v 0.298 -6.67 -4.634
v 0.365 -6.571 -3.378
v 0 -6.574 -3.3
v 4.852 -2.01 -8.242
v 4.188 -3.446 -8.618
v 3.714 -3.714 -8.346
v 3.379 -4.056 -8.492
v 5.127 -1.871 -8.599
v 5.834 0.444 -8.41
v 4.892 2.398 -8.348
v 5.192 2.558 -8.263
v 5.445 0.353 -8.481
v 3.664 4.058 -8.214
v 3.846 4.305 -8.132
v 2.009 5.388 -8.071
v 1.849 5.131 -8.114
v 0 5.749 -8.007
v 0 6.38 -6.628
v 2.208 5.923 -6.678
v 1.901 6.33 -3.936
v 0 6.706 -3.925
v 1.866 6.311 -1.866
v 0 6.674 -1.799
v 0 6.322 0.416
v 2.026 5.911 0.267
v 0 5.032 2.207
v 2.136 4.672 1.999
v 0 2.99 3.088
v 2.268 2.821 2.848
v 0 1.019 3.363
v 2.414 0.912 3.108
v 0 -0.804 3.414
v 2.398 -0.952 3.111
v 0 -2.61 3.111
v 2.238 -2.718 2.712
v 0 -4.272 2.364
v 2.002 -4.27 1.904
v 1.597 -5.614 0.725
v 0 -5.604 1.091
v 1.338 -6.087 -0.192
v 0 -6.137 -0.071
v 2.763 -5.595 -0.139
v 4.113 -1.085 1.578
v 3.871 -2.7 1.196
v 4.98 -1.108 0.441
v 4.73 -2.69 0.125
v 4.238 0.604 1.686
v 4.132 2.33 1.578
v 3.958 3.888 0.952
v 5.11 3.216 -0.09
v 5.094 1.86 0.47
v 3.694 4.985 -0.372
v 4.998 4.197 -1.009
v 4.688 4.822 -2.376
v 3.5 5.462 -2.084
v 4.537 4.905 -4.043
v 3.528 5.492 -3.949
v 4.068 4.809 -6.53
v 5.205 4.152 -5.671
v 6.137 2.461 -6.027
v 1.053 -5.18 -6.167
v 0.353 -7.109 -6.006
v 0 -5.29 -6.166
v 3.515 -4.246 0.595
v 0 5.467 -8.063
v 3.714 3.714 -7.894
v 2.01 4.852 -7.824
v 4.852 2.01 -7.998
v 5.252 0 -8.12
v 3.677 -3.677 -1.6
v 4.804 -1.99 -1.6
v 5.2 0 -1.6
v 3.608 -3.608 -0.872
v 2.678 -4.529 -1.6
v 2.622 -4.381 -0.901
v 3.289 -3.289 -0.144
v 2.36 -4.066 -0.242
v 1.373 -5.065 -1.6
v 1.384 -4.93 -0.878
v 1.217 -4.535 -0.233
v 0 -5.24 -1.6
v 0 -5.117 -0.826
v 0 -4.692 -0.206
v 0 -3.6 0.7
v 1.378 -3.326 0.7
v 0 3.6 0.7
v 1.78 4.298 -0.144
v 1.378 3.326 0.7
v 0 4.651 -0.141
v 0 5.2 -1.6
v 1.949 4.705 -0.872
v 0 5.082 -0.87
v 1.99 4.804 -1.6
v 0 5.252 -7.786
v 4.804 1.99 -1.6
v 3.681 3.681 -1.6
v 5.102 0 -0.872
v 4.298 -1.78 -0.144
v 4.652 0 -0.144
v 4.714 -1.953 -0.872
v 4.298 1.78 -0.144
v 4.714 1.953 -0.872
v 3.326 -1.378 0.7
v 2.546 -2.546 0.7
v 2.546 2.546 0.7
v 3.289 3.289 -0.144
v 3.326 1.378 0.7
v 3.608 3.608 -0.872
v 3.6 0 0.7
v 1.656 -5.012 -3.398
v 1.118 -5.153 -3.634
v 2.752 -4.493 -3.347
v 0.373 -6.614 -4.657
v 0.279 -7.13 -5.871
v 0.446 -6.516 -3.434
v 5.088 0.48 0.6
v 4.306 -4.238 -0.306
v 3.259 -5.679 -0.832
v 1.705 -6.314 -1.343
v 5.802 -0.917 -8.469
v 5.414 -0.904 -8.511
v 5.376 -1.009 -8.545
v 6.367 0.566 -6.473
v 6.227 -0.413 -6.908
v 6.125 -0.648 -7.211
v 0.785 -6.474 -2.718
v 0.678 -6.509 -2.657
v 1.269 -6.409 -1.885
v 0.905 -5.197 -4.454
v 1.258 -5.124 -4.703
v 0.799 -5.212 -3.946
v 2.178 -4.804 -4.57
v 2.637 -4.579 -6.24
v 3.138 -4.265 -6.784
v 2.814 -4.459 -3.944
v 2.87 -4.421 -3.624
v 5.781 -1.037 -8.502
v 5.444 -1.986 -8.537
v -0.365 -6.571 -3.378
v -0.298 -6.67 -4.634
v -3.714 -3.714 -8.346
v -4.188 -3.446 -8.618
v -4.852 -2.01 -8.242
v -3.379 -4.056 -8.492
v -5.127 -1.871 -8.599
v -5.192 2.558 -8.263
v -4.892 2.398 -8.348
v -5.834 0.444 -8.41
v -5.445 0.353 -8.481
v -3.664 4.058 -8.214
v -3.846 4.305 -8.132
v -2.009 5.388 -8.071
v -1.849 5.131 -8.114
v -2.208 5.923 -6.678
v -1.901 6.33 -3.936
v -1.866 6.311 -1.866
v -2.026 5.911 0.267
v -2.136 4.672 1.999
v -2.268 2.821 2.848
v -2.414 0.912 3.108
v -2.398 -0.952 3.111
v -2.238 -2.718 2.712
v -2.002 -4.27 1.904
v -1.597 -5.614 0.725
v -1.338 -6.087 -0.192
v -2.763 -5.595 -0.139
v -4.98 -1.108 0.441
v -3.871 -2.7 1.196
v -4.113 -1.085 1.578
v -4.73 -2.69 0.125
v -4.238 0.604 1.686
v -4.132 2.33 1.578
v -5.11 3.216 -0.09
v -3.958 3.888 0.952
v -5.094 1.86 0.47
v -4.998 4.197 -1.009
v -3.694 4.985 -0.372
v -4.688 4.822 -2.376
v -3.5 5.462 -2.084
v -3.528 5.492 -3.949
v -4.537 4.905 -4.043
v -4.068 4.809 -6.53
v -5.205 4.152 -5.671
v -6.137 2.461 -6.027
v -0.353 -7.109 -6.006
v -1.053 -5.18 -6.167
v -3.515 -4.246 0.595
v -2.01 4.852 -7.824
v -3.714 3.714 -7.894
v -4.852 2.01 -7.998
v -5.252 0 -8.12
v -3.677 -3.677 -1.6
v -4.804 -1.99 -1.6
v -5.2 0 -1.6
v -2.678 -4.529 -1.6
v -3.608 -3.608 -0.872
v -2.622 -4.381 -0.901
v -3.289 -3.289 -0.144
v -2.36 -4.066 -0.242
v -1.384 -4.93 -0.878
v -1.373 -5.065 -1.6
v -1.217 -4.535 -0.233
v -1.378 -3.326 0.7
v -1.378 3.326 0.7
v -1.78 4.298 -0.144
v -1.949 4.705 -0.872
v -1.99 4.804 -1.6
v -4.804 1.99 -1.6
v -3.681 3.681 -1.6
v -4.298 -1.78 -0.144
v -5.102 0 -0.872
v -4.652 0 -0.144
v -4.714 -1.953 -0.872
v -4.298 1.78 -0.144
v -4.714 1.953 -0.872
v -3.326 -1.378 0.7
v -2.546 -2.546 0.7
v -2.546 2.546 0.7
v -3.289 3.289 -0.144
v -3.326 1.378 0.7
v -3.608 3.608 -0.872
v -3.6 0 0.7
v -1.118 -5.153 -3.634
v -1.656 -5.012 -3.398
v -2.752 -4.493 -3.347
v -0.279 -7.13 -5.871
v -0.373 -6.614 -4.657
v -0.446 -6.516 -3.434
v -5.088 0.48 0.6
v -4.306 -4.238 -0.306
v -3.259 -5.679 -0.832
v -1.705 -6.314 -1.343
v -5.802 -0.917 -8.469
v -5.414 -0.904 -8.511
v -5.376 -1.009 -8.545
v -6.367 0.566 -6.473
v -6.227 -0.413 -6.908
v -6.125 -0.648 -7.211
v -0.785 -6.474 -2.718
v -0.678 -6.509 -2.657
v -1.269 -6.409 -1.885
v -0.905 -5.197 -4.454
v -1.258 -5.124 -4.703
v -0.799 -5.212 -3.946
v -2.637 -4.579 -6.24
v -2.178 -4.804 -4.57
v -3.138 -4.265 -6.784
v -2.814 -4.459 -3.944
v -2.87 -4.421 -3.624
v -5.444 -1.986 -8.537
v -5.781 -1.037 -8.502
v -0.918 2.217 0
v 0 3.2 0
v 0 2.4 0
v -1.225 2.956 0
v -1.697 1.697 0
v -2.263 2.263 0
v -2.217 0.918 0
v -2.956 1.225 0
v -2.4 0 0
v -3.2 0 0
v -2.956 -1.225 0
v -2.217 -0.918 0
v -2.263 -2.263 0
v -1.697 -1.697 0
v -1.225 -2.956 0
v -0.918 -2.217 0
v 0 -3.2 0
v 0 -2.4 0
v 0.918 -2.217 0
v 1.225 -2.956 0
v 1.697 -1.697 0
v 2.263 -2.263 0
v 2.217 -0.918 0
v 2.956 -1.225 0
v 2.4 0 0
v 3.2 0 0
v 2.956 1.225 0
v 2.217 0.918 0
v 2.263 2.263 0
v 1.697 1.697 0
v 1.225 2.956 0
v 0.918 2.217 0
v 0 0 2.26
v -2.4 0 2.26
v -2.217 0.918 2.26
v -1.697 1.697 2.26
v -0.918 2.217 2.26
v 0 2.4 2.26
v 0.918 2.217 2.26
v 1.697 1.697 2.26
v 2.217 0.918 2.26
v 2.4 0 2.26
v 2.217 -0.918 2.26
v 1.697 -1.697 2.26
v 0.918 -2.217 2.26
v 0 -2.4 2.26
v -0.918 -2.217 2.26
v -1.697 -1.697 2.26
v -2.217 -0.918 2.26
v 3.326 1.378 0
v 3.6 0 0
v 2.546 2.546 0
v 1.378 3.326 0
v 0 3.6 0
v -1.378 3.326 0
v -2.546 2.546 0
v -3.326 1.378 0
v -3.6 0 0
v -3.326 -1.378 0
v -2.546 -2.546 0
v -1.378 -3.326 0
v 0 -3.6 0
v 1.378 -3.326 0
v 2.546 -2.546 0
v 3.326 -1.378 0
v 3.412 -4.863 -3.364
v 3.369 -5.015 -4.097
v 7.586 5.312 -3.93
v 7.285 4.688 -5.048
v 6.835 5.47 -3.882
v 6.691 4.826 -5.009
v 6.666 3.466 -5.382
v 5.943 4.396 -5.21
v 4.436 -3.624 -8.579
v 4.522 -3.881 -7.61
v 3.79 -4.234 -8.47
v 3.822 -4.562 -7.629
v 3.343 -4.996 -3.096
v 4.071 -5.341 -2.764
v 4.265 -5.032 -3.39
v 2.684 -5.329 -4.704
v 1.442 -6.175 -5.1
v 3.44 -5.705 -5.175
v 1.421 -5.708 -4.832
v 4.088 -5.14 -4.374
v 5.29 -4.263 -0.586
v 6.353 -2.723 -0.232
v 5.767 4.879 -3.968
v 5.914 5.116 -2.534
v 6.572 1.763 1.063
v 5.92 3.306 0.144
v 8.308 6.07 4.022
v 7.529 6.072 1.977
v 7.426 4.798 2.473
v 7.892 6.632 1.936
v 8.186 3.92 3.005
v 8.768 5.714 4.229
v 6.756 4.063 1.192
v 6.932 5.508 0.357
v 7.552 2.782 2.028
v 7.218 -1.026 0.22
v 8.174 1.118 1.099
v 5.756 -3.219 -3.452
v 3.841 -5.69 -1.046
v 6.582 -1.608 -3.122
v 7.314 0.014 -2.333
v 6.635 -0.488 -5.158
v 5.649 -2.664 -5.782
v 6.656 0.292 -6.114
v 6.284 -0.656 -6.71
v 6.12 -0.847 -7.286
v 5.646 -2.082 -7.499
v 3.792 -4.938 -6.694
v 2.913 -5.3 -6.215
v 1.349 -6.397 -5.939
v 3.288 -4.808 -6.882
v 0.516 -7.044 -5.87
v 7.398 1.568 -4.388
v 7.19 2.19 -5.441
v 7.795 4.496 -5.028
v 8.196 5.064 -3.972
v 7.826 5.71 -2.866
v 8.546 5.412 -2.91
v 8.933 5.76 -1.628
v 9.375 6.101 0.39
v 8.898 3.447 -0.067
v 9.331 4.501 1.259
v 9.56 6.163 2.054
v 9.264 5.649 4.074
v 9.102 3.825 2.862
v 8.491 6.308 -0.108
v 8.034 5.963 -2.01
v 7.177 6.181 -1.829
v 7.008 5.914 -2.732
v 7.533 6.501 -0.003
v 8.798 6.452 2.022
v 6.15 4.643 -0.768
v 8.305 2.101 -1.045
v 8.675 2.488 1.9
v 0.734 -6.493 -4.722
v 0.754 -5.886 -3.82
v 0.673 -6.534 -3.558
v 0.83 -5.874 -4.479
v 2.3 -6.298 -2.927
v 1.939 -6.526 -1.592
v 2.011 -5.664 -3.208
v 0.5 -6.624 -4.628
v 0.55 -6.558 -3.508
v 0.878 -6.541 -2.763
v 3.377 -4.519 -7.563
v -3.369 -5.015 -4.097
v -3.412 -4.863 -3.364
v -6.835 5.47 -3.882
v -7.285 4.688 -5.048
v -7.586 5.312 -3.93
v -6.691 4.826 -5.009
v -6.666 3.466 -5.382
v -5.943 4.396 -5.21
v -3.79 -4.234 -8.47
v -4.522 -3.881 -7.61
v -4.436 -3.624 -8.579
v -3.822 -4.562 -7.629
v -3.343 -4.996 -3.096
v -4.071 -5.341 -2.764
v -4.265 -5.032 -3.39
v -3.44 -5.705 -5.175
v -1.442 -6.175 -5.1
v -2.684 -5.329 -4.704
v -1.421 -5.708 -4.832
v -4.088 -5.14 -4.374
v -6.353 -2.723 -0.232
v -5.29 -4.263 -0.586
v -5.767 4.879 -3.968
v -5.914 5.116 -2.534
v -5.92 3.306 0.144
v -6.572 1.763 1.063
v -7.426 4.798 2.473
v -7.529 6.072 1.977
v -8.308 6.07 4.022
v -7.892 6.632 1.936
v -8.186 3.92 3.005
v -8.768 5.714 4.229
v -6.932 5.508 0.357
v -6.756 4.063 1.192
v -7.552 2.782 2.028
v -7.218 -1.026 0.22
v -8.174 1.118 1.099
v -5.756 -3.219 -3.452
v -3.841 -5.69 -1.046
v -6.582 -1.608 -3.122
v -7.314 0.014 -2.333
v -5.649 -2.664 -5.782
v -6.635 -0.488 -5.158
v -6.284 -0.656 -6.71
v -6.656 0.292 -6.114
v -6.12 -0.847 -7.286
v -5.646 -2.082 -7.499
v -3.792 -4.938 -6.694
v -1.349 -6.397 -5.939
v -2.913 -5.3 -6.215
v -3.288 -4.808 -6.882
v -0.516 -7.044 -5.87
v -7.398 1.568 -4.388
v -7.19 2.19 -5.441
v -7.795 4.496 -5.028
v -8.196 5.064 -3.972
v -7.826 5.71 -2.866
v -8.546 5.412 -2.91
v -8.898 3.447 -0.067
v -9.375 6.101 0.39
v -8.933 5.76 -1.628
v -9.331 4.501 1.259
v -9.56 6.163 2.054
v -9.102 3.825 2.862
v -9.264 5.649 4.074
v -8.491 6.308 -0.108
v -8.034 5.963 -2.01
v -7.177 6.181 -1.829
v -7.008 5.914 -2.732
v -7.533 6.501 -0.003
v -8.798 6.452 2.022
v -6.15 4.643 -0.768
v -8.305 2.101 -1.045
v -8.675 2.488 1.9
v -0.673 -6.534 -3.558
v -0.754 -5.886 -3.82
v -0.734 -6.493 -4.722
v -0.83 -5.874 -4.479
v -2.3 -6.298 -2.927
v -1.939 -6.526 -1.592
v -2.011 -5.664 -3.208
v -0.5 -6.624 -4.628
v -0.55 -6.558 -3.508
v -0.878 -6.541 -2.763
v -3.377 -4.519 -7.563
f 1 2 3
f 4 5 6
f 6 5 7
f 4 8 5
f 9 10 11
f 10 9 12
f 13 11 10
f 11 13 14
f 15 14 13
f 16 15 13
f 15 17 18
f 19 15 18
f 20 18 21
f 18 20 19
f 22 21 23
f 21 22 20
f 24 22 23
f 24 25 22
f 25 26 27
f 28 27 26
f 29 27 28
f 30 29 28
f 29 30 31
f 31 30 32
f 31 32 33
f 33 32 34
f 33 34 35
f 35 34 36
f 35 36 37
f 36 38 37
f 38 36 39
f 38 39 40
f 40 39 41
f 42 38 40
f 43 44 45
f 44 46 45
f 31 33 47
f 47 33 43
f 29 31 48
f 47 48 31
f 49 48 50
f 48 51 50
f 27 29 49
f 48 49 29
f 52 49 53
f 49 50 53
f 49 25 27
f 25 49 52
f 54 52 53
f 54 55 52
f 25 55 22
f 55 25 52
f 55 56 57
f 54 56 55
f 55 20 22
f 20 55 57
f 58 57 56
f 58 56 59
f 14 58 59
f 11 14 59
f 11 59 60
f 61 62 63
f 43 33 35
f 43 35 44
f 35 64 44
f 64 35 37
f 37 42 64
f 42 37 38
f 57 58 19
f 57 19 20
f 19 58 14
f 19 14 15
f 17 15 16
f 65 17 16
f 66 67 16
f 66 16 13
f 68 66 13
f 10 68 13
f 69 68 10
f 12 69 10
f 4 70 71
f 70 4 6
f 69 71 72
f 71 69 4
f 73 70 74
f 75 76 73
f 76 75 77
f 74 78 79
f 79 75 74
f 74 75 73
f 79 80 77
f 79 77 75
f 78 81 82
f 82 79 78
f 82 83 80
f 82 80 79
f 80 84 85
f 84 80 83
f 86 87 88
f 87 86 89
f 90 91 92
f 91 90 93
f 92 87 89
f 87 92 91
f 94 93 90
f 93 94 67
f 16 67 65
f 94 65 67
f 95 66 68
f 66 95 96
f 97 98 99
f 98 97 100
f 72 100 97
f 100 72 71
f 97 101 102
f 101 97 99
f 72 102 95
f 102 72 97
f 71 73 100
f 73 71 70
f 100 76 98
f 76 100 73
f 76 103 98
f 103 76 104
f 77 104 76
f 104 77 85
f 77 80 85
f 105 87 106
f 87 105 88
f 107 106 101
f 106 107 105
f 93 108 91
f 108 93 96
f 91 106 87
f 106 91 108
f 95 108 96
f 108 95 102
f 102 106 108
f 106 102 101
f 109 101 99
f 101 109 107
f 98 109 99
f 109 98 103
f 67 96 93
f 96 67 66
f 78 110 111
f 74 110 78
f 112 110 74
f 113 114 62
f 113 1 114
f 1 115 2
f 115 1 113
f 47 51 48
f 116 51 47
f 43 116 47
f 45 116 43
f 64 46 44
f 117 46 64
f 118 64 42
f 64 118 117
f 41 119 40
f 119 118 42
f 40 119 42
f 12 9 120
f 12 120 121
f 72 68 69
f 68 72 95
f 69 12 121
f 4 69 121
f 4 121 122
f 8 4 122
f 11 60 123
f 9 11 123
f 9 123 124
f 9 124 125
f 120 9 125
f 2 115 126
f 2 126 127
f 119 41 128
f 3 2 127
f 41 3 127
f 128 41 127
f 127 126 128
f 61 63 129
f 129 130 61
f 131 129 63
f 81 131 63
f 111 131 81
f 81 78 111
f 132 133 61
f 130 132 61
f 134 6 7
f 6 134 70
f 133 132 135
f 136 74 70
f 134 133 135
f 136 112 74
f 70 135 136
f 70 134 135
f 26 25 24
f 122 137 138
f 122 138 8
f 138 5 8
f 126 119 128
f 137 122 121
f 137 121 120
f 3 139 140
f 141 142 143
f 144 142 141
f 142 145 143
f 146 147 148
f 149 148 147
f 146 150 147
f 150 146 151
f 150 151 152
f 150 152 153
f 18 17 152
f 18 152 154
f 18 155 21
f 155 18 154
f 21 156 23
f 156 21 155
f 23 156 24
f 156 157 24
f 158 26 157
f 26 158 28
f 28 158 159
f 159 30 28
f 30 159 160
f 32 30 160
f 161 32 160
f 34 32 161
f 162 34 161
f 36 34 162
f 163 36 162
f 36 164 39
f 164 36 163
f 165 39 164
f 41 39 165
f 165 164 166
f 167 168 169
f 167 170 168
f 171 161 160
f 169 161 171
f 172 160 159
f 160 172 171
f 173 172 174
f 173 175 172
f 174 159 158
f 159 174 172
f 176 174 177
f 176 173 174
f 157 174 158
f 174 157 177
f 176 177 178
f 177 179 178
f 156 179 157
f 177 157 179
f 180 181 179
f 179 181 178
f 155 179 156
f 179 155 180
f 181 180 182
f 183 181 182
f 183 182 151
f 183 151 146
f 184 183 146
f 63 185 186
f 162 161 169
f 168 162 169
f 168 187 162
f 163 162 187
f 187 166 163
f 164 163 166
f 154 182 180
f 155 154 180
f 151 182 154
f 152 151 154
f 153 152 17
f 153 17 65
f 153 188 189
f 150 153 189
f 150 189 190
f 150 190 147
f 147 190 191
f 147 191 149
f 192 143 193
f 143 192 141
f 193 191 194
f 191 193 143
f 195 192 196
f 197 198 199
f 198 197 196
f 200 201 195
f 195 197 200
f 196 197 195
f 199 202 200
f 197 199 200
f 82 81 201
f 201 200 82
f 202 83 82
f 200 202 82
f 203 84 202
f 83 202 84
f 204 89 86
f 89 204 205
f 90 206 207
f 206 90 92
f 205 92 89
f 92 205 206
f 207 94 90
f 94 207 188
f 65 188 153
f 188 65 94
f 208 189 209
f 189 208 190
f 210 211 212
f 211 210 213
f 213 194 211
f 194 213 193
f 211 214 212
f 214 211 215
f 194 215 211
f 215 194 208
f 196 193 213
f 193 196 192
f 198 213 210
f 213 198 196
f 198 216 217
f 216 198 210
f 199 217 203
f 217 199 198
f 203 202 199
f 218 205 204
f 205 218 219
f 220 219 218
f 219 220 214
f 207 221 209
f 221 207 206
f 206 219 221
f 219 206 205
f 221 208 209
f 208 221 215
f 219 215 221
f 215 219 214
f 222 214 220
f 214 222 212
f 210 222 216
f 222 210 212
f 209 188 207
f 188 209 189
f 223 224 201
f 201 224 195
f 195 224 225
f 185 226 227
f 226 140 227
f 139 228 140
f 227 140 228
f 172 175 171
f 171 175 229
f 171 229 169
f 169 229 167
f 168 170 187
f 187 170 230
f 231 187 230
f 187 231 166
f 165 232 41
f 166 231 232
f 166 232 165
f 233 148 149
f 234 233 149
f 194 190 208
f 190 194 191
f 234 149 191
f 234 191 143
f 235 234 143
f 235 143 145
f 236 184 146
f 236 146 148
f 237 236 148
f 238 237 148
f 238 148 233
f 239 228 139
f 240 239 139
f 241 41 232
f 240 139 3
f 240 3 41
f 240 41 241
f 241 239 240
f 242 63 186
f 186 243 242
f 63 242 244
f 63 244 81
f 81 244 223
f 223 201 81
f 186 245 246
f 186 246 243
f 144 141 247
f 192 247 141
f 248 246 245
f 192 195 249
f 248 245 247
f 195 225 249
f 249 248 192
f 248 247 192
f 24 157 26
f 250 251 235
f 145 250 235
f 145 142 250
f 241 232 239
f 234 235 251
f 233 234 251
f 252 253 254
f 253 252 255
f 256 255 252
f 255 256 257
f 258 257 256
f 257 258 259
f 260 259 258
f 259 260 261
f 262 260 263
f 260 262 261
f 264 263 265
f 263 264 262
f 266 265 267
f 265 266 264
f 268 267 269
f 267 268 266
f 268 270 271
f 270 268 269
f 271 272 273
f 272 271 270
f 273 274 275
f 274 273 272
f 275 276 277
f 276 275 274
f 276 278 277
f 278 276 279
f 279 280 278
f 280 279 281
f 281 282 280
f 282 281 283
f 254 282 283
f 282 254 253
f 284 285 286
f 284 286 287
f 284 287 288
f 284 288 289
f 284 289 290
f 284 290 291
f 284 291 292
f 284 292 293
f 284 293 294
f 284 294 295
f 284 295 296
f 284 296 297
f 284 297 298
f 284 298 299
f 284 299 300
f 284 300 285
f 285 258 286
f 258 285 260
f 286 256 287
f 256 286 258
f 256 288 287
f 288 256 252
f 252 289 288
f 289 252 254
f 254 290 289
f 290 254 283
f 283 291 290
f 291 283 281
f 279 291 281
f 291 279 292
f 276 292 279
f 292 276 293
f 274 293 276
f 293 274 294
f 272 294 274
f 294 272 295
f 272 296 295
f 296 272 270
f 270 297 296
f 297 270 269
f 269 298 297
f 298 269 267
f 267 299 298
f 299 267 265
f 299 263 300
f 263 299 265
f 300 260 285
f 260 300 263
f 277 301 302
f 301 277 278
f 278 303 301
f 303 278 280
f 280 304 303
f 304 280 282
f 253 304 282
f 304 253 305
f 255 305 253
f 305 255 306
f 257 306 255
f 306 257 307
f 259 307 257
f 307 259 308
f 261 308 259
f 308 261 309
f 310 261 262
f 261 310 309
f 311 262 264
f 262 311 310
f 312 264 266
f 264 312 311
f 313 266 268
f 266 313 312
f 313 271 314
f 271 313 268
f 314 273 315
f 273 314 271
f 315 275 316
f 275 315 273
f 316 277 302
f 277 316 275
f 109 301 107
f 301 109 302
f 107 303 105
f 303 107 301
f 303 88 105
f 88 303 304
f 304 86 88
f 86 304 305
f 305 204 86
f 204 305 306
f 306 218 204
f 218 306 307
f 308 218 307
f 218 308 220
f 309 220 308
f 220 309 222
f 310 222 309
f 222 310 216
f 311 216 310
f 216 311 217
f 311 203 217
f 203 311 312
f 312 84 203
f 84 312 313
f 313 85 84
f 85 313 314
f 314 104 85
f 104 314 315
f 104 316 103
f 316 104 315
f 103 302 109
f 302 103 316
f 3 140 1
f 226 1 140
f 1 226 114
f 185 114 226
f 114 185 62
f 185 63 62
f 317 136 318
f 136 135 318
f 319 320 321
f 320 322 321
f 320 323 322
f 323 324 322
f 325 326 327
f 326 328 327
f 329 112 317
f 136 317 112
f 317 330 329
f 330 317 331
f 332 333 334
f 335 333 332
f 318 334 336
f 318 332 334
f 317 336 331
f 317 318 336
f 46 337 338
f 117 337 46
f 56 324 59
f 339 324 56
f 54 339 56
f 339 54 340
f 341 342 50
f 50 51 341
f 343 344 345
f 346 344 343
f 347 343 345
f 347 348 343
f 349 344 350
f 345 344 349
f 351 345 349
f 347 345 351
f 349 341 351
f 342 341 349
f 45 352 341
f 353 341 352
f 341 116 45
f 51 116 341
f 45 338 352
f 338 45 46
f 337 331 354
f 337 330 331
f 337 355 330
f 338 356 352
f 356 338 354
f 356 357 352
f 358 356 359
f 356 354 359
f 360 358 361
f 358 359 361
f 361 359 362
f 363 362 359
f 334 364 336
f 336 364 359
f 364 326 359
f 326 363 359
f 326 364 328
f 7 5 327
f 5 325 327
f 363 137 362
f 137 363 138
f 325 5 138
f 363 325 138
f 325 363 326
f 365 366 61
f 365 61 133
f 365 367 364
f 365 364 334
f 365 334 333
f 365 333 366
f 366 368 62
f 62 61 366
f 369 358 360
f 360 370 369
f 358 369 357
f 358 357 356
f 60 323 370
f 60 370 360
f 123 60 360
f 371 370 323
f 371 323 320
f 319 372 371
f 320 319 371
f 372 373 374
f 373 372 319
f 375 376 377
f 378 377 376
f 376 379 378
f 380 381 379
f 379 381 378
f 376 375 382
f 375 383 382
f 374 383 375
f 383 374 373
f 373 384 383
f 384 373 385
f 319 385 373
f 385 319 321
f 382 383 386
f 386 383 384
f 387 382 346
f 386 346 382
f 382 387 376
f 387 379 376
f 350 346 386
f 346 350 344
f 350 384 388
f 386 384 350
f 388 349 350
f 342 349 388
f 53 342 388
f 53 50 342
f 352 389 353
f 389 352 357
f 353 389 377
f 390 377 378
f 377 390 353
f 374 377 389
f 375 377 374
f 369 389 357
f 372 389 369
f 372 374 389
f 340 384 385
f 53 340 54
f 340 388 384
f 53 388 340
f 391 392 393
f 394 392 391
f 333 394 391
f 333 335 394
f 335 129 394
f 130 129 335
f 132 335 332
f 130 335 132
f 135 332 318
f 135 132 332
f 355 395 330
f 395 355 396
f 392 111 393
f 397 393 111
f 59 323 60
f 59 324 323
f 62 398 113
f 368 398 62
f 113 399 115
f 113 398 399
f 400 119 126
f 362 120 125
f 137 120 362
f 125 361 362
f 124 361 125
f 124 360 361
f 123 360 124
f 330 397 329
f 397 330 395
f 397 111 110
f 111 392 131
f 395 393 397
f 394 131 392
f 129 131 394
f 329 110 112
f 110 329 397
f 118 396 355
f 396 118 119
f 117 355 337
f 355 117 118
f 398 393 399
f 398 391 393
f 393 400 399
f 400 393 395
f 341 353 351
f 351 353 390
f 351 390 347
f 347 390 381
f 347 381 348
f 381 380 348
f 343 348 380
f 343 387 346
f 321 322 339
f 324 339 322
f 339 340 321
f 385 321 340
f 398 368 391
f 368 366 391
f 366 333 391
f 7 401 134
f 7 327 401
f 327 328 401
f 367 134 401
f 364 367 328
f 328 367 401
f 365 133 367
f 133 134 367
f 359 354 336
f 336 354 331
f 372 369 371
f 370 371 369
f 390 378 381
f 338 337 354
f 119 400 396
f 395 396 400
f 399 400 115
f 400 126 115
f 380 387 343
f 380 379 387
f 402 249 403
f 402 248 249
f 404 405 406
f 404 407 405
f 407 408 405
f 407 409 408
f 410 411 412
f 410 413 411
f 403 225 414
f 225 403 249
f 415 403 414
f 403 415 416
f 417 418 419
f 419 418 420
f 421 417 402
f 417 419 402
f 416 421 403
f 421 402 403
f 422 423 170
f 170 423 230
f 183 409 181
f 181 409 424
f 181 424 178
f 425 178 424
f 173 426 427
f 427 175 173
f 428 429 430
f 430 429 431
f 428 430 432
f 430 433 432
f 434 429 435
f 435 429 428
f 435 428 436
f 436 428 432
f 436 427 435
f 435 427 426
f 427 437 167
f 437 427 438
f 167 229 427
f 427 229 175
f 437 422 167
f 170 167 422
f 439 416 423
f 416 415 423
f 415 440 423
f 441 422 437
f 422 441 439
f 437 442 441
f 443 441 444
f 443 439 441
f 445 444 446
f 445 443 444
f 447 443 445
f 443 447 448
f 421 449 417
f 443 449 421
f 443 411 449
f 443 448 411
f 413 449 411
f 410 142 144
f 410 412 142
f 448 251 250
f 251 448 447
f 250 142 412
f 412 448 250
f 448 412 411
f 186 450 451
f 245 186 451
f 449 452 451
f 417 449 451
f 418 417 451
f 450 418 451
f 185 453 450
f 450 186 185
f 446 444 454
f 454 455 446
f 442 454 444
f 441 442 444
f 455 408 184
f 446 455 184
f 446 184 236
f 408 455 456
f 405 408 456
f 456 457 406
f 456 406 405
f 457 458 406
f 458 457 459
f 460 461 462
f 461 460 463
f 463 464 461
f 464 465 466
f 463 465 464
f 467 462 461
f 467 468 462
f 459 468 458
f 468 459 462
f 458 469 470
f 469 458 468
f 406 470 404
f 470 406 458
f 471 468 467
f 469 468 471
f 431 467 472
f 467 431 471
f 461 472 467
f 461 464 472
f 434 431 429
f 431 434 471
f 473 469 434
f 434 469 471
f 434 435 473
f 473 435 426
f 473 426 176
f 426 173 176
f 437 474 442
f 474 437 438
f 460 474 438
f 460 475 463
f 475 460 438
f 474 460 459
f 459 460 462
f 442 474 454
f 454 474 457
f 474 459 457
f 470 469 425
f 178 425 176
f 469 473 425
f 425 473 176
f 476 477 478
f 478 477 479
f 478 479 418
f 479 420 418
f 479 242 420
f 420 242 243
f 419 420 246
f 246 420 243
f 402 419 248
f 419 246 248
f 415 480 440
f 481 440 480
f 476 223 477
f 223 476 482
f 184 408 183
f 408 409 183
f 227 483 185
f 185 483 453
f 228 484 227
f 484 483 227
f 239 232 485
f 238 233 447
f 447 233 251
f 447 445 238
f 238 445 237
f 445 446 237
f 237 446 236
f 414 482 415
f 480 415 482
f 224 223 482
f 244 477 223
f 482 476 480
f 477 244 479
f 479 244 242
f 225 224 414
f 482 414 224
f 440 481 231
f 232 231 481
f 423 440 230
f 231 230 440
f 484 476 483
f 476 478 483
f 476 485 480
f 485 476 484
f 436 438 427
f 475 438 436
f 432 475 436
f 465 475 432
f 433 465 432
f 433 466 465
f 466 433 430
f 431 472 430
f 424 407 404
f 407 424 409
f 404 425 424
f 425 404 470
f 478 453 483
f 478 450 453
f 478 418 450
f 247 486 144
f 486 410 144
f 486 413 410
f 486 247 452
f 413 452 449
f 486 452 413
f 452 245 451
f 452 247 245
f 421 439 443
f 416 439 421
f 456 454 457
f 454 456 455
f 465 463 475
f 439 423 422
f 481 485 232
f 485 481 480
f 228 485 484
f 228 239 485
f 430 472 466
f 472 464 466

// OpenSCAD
use <../lib.scad>
use <../p/4-4cylo.scad>
use <../p/4-4ring8.scad>
use <s/17018s01.scad>
use <s/17018s02.scad>
use <../p/stud4o.scad>
function ldraw_lib__17018() = [
// 0 Minifig Helmet Wolverine
// 0 Name: 17018.dat
// 0 Author: Magnus Forsberg [MagFors]
// 0 !LDRAW_ORG Part UPDATE 2023-04
// 0 !LICENSE Licensed under CC BY 4.0 : see CAreadme.txt
// 
// 0 BFC CERTIFY CCW
  [0,"BFC","CERTIFY"],
  [0,"BFC","CCW"],
// 
// 0 !CATEGORY Minifig Headwear
// 
// 0 !HISTORY 2014-10-16 {LEGO Digital Designer} Original part shape
// 0 !HISTORY 2022-06-12 [MagFors] File preparation for LDraw Parts Tracker
// 0 !HISTORY 2023-08-25 [OrionP] Official Update 2023-04
// 
// 
// 1 16 0 0 0 1 0 0 0 1 0 0 0 1 s\17018s01.dat
  [1,16,0,0,0,1,0,0,0,1,0,0,0,1, ldraw_lib__s__17018s01()],
// 1 16 0 0 0 -1 0 0 0 1 0 0 0 1 s\17018s01.dat
  [1,16,0,0,0,-1,0,0,0,1,0,0,0,1, ldraw_lib__s__17018s01()],
// 1 16 0 -5.65 0 1 0 0 0 -1.4125 0 0 0 1 stud4o.dat
  [1,16,0,-5.65,0,1,0,0,0,-1.4125,0,0,0,1, ldraw_lib__stud4o()],
// 1 16 0 0 0 1 0 0 0 -1 0 0 0 1 4-4ring8.dat
  [1,16,0,0,0,1,0,0,0,-1,0,0,0,1, ldraw_lib__4_4ring8()],
// 1 16 0 0 0 9 0 0 0 -1.75 0 0 0 9 4-4cylo.dat
  [1,16,0,0,0,9,0,0,0,-1.75,0,0,0,9, ldraw_lib__4_4cylo()],
// 3 16 0 8.249 -16.435 -0.745 11.586 -16.675 0.745 11.586 -16.675
  [3,16,0,8.249,-16.435,-0.745,11.586,-16.675,0.745,11.586,-16.675],
// 4 16 0.745 11.586 -16.675 -0.745 11.586 -16.675 -0.697 14.678 -17.825 0.697 14.678 -17.825
  [4,16,0.745,11.586,-16.675,-0.745,11.586,-16.675,-0.697,14.678,-17.825,0.697,14.678,-17.825],
// 4 16 -0.697 14.678 -17.825 -0.882 15.014 -17.772 0.882 15.014 -17.772 0.697 14.678 -17.825
  [4,16,-0.697,14.678,-17.825,-0.882,15.014,-17.772,0.882,15.014,-17.772,0.697,14.678,-17.825],
// 3 16 -0.882 15.014 -17.772 0 15.414 -13.2249 0.882 15.014 -17.772
  [3,16,-0.882,15.014,-17.772,0,15.414,-13.2249,0.882,15.014,-17.772],
// 5 24 -0.697 14.678 -17.825 0.697 14.678 -17.825 -0.882 15.014 -17.772 -0.745 11.586 -16.675
  [5,24,-0.697,14.678,-17.825,0.697,14.678,-17.825,-0.882,15.014,-17.772,-0.745,11.586,-16.675],
// 5 24 0 -8.535 -2.01 0 -7.778 -6.526 -5.996 -7.777 -2.38 5.996 -7.777 -2.38
  [5,24,0,-8.535,-2.01,0,-7.778,-6.526,-5.996,-7.777,-2.38,5.996,-7.777,-2.38],
// 5 24 0 -5.91 -10.68 0 -2.727 -14.011 -5.006 -4.761 -10.676 5.006 -4.761 -10.676
  [5,24,0,-5.91,-10.68,0,-2.727,-14.011,-5.006,-4.761,-10.676,5.006,-4.761,-10.676],
// 5 24 0 8.249 -16.435 0.745 11.586 -16.675 -0.745 11.586 -16.675 0.912 8.446 -16.427
  [5,24,0,8.249,-16.435,0.745,11.586,-16.675,-0.745,11.586,-16.675,0.912,8.446,-16.427],
// 5 24 0 20.017 14.373 0 16.571 15.951 5.023 20.178 13.469 -5.023 20.178 13.469
  [5,24,0,20.017,14.373,0,16.571,15.951,5.023,20.178,13.469,-5.023,20.178,13.469],
// 5 24 0 9.812 16.764 0 4.498 16.685 4.752 9.839 15.824 -4.752 9.839 15.824
  [5,24,0,9.812,16.764,0,4.498,16.685,4.752,9.839,15.824,-4.752,9.839,15.824],
// 5 24 0 0.177 -15.342 0 8.249 -16.435 -1.695 6.643 -16.273 1.695 6.643 -16.273
  [5,24,0,0.177,-15.342,0,8.249,-16.435,-1.695,6.643,-16.273,1.695,6.643,-16.273],
// 5 24 0 -1.75 9 0 0.352 11.628 -4.4508 0.36 10.745 4.4508 0.36 10.745
  [5,24,0,-1.75,9,0,0.352,11.628,-4.4508,0.36,10.745,4.4508,0.36,10.745],
// 5 24 0 0.514 -11.731 0 -1.75 -9 -3.043 0.582 -11.337 3.043 0.582 -11.337
  [5,24,0,0.514,-11.731,0,-1.75,-9,-3.043,0.582,-11.337,3.043,0.582,-11.337],
// 5 24 0 16.571 15.951 0 9.812 16.764 5.519 16.696 14.807 -5.519 16.696 14.807
  [5,24,0,16.571,15.951,0,9.812,16.764,5.519,16.696,14.807,-5.519,16.696,14.807],
// 5 24 0 -8.408 2.548 0 -8.535 -2.01 -6.034 -7.77 2.28 6.034 -7.77 2.28
  [5,24,0,-8.408,2.548,0,-8.535,-2.01,-6.034,-7.77,2.28,6.034,-7.77,2.28],
// 5 24 -0.882 15.014 -17.772 0 15.414 -13.2249 -2.6321 15.418 -12.9492 0.882 15.014 -17.772
  [5,24,-0.882,15.014,-17.772,0,15.414,-13.2249,-2.6321,15.418,-12.9492,0.882,15.014,-17.772],
// 5 24 0 -7.778 -6.526 0 -5.91 -10.68 -5.595 -6.78 -6.794 5.595 -6.78 -6.794
  [5,24,0,-7.778,-6.526,0,-5.91,-10.68,-5.595,-6.78,-6.794,5.595,-6.78,-6.794],
// 5 24 0 20.157 13.668 0 20.017 14.373 4.622 20.285 12.828 -4.622 20.285 12.828
  [5,24,0,20.157,13.668,0,20.017,14.373,4.622,20.285,12.828,-4.622,20.285,12.828],
// 5 24 0 4.498 16.685 0 -1.041 15.805 4.665 4.665 15.777 -4.665 4.665 15.777
  [5,24,0,4.498,16.685,0,-1.041,15.805,4.665,4.665,15.777,-4.665,4.665,15.777],
// 5 24 0 19.466 13.13 0 20.157 13.668 -5.0249 19.5609 12.1308 5.0249 19.5609 12.1308
  [5,24,0,19.466,13.13,0,20.157,13.668,-5.0249,19.5609,12.1308,5.0249,19.5609,12.1308],
// 5 24 0 -5.518 12.58 0 -7.719 7.474 5.341 -4.998 11.68 -5.341 -4.998 11.68
  [5,24,0,-5.518,12.58,0,-7.719,7.474,5.341,-4.998,11.68,-5.341,-4.998,11.68],
// 2 24 -0.882 15.014 -17.772 0.882 15.014 -17.772
  [2,24,-0.882,15.014,-17.772,0.882,15.014,-17.772],
// 5 24 0 8.249 -16.435 -0.745 11.586 -16.675 -0.912 8.446 -16.427 0.745 11.586 -16.675
  [5,24,0,8.249,-16.435,-0.745,11.586,-16.675,-0.912,8.446,-16.427,0.745,11.586,-16.675],
// 5 24 0 -7.719 7.474 0 -8.408 2.548 5.671 -7.119 7.052 -5.671 -7.119 7.052
  [5,24,0,-7.719,7.474,0,-8.408,2.548,5.671,-7.119,7.052,-5.671,-7.119,7.052],
// 5 24 -0.745 11.586 -16.675 0.745 11.586 -16.675 0 8.249 -16.435 -0.697 14.678 -17.825
  [5,24,-0.745,11.586,-16.675,0.745,11.586,-16.675,0,8.249,-16.435,-0.697,14.678,-17.825],
// 5 24 0 -2.727 -14.011 0 0.177 -15.342 -3.345 0.48 -15.217 3.345 0.48 -15.217
  [5,24,0,-2.727,-14.011,0,0.177,-15.342,-3.345,0.48,-15.217,3.345,0.48,-15.217],
// 5 24 0.882 15.014 -17.772 0 15.414 -13.2249 -0.882 15.014 -17.772 2.6321 15.418 -12.9492
  [5,24,0.882,15.014,-17.772,0,15.414,-13.2249,-0.882,15.014,-17.772,2.6321,15.418,-12.9492],
// 5 24 0 -1.041 15.805 0 -5.518 12.58 5.066 -0.668 14.777 -5.066 -0.668 14.777
  [5,24,0,-1.041,15.805,0,-5.518,12.58,5.066,-0.668,14.777,-5.066,-0.668,14.777],
// 5 24 0 15.414 -13.2249 0 4 -13.1007 1.9968 9.866 -13.03 -1.9968 9.866 -13.03
  [5,24,0,15.414,-13.2249,0,4,-13.1007,1.9968,9.866,-13.03,-1.9968,9.866,-13.03],
// 5 24 0 4 -13.1007 0 2.065 -12.7921 3.4335 4 -12.6624 -3.4335 4 -12.6624
  [5,24,0,4,-13.1007,0,2.065,-12.7921,3.4335,4,-12.6624,-3.4335,4,-12.6624],
// 5 24 0 .514 -11.731 0 2.065 -12.7921 3.043 .582 -11.337 -3.043 .582 -11.337
  [5,24,0,.514,-11.731,0,2.065,-12.7921,3.043,.582,-11.337,-3.043,.582,-11.337],
// 5 24 0 2.176 12.7038 0 .352 11.628 -4.8719 2.18 11.7615 4.8719 2.18 11.7615
  [5,24,0,2.176,12.7038,0,.352,11.628,-4.8719,2.18,11.7615,4.8719,2.18,11.7615],
// 5 24 0 4 13 0 2.176 12.7038 -4.9751 4 12.0107 4.9751 4 12.0107
  [5,24,0,4,13,0,2.176,12.7038,-4.9751,4,12.0107,4.9751,4,12.0107],
// 5 24 0 4 13 0 19.466 13.13 4.9751 4 12.0107 -4.9751 4 12.0107
  [5,24,0,4,13,0,19.466,13.13,4.9751,4,12.0107,-4.9751,4,12.0107],
// 1 16 0 0 0 1 0 0 0 1 0 0 0 1 s\17018s02.dat
  [1,16,0,0,0,1,0,0,0,1,0,0,0,1, ldraw_lib__s__17018s02()],
// 1 16 0 0 0 -1 0 0 0 1 0 0 0 1 s\17018s02.dat
  [1,16,0,0,0,-1,0,0,0,1,0,0,0,1, ldraw_lib__s__17018s02()],
];
module ldraw_lib__17018(step=0, col=false, unit=2/5, alt=false, line=0.2, solid=!$preview)
    makepoly(ldraw_lib__17018(), step=step, col=col, unit=unit, alt=alt, line=line, solid=solid);
ldraw_lib__17018(line=0.2);
